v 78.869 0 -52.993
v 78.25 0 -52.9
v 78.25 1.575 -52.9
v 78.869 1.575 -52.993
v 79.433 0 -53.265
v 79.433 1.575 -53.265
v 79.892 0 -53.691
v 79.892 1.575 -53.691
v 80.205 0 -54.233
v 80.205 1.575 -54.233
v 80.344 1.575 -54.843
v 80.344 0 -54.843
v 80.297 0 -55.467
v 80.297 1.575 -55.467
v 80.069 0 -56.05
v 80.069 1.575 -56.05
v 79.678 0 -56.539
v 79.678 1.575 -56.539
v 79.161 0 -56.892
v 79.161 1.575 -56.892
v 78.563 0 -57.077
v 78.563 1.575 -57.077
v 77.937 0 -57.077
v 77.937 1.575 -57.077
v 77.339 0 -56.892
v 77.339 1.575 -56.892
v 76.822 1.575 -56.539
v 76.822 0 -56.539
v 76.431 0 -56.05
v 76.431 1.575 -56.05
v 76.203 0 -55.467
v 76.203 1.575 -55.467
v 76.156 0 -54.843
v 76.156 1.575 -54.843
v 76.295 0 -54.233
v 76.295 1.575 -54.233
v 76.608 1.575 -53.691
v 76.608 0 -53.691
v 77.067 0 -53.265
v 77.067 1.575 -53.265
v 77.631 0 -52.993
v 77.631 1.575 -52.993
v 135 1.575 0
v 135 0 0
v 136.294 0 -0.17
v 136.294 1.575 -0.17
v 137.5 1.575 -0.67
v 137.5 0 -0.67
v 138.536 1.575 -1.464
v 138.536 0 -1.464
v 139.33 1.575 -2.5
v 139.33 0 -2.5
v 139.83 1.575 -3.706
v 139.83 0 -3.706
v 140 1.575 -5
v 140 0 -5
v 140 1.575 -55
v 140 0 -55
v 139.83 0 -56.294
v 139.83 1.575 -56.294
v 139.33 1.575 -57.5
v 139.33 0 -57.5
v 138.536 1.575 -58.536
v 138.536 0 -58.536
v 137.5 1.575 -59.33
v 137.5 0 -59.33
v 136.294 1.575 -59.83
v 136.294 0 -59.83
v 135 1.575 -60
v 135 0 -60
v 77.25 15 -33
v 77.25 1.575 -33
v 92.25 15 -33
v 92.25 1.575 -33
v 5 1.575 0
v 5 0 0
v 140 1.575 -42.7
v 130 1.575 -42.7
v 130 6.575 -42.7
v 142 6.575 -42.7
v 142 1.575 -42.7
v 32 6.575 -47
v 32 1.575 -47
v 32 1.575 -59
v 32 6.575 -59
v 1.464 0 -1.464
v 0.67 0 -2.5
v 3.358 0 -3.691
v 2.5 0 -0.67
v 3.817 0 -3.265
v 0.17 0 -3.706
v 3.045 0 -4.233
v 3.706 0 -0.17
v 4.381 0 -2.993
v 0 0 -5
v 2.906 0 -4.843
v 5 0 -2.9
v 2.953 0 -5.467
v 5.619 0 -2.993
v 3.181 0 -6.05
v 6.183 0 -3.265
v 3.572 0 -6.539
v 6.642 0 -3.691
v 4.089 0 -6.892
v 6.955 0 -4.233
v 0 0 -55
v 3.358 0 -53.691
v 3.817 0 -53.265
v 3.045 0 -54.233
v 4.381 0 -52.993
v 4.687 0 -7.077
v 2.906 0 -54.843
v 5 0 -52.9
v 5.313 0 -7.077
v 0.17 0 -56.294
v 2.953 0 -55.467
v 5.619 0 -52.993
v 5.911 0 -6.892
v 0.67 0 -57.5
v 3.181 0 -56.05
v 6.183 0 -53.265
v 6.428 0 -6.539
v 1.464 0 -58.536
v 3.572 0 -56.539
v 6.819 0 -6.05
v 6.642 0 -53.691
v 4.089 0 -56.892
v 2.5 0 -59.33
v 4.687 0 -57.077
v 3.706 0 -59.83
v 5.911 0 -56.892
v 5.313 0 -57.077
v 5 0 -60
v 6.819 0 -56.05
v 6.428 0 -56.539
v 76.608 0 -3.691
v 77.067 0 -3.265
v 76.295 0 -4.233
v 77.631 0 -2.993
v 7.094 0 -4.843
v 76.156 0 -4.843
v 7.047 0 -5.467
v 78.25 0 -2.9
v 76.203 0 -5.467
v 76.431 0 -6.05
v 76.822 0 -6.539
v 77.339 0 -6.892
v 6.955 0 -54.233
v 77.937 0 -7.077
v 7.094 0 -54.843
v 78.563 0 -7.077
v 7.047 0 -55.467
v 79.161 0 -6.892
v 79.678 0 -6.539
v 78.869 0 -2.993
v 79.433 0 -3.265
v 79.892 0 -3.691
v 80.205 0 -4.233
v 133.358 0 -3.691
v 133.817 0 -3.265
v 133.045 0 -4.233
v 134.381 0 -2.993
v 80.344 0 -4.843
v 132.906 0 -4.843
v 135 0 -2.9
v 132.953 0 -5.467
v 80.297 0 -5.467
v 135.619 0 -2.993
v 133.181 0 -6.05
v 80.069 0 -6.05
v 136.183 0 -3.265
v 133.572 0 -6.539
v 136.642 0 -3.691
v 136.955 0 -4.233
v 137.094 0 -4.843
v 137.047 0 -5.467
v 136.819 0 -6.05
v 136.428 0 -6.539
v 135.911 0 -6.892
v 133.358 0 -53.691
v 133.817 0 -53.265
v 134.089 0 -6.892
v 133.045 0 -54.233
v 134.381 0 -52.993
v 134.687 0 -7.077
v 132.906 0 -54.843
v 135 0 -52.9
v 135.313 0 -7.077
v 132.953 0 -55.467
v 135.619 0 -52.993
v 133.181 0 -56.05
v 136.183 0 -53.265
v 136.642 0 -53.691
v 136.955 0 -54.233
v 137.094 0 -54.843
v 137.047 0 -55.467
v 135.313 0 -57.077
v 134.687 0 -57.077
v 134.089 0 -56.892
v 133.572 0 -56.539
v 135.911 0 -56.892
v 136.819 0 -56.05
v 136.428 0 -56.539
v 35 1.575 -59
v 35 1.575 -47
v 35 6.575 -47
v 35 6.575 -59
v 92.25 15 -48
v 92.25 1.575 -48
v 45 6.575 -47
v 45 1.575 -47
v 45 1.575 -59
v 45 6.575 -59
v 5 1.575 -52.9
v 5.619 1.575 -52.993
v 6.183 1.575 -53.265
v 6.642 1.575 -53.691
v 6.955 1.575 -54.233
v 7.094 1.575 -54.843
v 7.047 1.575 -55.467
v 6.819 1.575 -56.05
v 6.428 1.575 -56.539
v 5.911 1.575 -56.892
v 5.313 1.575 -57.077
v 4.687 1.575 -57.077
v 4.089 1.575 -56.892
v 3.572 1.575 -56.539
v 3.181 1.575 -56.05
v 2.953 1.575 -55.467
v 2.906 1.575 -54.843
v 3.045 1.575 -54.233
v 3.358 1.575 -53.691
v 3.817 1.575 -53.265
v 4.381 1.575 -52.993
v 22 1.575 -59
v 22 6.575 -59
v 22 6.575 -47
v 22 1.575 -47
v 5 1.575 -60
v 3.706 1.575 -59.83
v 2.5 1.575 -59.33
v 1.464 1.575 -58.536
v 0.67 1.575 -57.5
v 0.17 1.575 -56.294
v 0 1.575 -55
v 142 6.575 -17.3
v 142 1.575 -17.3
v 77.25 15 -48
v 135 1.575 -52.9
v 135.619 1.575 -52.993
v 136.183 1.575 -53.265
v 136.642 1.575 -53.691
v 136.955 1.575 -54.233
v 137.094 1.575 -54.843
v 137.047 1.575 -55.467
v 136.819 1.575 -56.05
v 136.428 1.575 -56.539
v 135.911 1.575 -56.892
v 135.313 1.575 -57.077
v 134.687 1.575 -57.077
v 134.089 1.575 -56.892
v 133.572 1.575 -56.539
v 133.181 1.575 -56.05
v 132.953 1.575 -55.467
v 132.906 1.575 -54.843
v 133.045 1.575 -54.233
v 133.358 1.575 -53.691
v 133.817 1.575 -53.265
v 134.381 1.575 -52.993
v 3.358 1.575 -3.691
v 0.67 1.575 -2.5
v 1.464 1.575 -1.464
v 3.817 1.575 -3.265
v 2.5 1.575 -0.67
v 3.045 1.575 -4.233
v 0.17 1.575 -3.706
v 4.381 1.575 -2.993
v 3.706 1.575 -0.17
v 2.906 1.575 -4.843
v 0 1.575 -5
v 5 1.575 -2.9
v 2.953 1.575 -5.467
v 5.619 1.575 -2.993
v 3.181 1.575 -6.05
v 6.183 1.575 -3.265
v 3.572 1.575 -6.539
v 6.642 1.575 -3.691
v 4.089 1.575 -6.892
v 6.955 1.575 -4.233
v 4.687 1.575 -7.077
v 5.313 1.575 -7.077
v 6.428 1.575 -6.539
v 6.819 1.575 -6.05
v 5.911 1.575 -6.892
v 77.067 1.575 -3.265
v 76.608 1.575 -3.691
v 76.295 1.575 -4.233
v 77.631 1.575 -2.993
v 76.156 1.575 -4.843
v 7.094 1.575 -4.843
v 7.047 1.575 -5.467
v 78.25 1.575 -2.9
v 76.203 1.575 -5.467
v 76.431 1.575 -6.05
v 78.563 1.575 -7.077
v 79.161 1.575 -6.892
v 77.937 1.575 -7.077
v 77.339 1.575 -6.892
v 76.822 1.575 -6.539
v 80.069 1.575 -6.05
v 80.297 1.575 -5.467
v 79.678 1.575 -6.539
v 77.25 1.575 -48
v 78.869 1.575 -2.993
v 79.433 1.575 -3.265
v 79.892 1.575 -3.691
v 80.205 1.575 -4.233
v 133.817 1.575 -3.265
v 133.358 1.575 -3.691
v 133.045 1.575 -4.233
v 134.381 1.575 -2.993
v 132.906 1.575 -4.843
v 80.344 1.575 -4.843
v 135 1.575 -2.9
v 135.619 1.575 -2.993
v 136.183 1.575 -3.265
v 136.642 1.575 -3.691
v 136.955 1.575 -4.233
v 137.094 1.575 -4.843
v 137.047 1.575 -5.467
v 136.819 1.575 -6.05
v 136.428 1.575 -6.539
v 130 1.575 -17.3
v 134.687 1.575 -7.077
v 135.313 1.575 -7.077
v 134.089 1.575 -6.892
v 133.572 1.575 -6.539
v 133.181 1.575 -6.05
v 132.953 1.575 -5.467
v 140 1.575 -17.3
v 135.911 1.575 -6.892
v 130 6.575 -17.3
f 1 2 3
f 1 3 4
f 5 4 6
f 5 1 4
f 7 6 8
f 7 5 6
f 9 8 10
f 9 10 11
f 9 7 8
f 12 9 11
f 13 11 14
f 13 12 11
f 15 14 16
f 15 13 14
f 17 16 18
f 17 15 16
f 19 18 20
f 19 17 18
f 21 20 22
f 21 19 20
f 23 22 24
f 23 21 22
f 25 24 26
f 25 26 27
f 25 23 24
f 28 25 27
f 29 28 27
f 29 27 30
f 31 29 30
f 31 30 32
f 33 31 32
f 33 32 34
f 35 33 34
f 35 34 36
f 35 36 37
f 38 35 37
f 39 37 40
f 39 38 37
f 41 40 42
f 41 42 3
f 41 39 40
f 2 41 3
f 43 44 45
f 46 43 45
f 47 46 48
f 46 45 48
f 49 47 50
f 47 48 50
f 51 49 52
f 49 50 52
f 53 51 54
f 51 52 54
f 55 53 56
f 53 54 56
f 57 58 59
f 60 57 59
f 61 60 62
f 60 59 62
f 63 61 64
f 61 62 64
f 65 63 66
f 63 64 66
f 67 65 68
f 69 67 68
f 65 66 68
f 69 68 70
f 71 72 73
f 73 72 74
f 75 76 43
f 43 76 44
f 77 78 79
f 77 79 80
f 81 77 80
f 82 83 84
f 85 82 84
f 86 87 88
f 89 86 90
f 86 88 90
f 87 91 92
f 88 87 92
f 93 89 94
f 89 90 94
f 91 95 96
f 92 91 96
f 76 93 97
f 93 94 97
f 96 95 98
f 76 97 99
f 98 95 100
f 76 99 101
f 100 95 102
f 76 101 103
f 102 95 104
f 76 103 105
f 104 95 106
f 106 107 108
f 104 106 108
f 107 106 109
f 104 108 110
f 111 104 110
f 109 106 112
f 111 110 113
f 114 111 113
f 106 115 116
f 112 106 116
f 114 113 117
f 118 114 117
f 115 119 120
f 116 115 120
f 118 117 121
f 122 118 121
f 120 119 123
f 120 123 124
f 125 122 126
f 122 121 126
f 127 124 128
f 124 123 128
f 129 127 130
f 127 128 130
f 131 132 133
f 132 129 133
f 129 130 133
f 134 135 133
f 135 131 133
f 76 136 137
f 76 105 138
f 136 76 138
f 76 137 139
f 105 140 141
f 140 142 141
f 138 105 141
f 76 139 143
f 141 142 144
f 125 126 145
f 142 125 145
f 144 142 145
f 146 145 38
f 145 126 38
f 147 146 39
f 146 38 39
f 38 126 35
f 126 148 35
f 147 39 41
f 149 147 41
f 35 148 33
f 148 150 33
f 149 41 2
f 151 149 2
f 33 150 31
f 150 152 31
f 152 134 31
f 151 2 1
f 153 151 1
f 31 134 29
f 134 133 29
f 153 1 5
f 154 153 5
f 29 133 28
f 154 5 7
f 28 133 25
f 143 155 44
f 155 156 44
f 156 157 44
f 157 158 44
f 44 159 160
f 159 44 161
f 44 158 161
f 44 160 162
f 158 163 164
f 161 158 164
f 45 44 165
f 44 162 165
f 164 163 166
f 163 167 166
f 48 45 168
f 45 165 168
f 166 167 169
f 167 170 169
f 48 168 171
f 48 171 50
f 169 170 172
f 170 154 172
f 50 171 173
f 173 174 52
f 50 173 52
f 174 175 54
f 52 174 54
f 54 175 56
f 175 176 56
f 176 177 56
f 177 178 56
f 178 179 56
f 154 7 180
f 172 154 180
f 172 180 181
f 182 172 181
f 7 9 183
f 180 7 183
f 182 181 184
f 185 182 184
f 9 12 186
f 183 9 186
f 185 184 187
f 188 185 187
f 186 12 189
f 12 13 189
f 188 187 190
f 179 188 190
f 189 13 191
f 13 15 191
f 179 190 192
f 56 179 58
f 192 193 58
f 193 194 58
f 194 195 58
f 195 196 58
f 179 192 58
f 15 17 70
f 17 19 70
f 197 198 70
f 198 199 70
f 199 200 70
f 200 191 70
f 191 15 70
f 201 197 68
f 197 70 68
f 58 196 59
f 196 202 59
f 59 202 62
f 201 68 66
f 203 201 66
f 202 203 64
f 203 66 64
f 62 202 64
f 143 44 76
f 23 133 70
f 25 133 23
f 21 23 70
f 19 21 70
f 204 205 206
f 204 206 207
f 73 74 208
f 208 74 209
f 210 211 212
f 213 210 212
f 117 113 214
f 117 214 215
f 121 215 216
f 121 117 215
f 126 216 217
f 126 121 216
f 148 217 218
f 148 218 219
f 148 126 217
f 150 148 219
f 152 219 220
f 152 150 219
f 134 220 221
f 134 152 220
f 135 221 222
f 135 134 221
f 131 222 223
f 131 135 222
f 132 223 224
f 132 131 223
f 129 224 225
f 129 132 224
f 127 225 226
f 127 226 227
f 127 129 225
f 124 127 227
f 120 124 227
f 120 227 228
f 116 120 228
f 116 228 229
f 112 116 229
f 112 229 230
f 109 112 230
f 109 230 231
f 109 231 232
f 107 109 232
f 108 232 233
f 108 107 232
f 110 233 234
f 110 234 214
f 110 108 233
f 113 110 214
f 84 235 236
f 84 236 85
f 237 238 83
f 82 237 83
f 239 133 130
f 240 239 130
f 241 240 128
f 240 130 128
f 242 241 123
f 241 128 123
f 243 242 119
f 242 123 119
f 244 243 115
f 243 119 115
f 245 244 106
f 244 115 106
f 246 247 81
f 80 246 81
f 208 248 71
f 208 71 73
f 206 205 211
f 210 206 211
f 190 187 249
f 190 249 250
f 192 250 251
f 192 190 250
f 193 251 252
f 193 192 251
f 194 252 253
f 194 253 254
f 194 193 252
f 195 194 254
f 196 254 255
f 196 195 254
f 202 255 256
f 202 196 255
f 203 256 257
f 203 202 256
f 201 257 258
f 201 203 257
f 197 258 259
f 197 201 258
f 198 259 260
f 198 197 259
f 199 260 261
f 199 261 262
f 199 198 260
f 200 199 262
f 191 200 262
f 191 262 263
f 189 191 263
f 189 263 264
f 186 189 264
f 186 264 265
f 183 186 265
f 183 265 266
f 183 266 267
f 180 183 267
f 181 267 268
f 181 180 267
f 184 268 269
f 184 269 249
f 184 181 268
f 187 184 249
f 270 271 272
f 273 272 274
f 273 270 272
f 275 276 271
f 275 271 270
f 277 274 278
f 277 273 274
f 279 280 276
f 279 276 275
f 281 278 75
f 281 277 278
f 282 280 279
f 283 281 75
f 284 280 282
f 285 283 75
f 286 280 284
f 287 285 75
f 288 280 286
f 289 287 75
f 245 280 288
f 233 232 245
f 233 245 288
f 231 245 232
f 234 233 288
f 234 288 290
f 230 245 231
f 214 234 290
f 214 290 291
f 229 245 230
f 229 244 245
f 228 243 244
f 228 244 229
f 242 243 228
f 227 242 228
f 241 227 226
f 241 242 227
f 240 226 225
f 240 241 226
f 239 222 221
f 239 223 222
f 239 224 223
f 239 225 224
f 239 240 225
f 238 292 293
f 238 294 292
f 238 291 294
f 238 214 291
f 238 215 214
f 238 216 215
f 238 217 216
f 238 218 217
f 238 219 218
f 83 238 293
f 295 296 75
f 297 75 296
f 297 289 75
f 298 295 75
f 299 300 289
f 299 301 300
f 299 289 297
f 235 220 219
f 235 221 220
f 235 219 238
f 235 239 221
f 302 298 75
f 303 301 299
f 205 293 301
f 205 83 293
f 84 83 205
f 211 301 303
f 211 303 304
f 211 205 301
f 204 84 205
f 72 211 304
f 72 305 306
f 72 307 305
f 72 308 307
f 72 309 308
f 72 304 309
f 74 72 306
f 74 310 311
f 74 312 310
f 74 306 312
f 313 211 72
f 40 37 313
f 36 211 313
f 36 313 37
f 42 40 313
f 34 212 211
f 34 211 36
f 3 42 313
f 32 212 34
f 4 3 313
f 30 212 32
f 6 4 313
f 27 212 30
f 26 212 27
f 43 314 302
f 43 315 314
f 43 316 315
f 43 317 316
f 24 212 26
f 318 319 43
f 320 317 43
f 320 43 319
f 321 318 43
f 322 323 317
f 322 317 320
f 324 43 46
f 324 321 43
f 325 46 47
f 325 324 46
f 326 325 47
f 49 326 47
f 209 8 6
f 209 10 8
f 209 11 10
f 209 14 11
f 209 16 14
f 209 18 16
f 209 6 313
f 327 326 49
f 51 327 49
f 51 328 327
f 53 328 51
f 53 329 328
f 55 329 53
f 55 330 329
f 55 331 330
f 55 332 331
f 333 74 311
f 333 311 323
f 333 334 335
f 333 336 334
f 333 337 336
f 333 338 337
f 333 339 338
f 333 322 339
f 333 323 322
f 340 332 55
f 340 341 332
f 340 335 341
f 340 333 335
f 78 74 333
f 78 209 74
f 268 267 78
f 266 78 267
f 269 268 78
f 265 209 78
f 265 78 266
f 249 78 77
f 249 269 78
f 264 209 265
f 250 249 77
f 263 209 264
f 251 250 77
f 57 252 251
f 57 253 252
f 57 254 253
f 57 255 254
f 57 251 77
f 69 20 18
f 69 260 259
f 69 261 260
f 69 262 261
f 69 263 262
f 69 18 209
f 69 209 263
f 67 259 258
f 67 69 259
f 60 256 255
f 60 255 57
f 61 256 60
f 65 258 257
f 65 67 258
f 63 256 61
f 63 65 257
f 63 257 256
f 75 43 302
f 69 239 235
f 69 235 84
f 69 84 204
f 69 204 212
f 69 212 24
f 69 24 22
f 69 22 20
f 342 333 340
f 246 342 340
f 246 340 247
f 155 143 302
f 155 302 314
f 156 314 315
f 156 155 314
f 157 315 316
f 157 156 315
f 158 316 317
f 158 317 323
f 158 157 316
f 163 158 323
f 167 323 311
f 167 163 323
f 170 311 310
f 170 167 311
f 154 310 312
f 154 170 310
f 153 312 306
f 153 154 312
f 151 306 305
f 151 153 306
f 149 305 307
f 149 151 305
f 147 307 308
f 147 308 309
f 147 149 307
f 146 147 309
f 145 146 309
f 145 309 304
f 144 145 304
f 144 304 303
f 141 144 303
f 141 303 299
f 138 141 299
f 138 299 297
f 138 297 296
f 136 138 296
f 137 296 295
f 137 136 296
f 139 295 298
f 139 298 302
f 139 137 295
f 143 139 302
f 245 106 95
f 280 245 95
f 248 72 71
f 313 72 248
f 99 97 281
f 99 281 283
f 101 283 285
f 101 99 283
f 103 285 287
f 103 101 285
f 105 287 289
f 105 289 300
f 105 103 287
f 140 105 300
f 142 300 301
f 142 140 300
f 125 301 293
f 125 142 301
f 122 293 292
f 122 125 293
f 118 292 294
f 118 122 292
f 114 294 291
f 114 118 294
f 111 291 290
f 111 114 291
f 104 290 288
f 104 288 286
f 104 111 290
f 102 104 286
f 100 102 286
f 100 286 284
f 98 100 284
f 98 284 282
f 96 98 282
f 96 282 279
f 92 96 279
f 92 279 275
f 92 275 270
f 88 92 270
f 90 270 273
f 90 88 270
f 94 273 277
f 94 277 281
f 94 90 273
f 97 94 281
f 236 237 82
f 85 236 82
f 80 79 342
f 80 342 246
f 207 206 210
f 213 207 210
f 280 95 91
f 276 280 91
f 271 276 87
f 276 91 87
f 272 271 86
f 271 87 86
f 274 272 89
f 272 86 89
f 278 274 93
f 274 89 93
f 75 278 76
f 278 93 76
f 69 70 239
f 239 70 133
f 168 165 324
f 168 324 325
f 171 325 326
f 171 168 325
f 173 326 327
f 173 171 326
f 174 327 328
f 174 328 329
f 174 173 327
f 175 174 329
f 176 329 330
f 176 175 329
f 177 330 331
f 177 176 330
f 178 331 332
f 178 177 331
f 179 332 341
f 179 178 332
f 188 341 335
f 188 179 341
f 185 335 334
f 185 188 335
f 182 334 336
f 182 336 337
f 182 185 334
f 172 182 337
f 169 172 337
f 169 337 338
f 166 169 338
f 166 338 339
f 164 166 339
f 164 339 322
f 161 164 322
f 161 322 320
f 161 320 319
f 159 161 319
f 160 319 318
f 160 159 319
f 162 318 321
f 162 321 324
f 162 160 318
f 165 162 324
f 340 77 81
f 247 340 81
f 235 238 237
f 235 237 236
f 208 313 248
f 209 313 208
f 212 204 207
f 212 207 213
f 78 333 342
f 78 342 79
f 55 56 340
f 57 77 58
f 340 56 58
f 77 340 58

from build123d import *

# Parameters (mm, degrees)
SKETCH2_R           = 2.1
BOSS_EXTRUDE1_DEPTH = 1.5748
SKETCH3_W           = 12
SKETCH3_H           = 25.4
SKETCH3_W_2         = 10
SKETCH3_H_2         = 12
BOSS_EXTRUDE2_DEPTH = 5
SKETCH5_W           = 15
SKETCH5_H           = 15
BOSS_EXTRUDE3_DEPTH = 13.4252


with BuildPart() as part:
    # Sketch2 → Boss-Extrude1 (new body)
    with BuildSketch(Plane(origin=(0, 0, 0), x_dir=(1, 0, 0), z_dir=(0, 1, 0))):
        with BuildLine():
            Line((5, 0), (135, 0))
            ThreePointArc((135, 0), (138.535533906, 1.464466094), (140, 5))
            Line((140, 5), (140, 55))
            ThreePointArc((140, 55), (138.535533906, 58.535533906), (135, 60))
            Line((135, 60), (5, 60))
            ThreePointArc((5, 60), (1.464466094, 58.535533906), (0, 55))
            Line((0, 55), (0, 5))
            ThreePointArc((0, 5), (1.464466094, 1.464466094), (5, 0))
        make_face()
        with Locations(Location((5, 55, 0), (0, 0, 270))):
            Circle(SKETCH2_R, mode=Mode.SUBTRACT)
        with Locations(Location((5, 5, 0), (0, 0, 270))):
            Circle(SKETCH2_R, mode=Mode.SUBTRACT)
        with Locations(Location((135, 5, 0), (0, 0, 270))):
            Circle(SKETCH2_R, mode=Mode.SUBTRACT)
        with Locations(Location((135, 55, 0), (0, 0, 270))):
            Circle(SKETCH2_R, mode=Mode.SUBTRACT)
        with Locations(Location((78.249999964, 55, 0), (0, 0, 270))):
            Circle(SKETCH2_R, mode=Mode.SUBTRACT)
        with Locations(Location((78.249999964, 5, 0), (0, 0, 270))):
            Circle(SKETCH2_R, mode=Mode.SUBTRACT)
    extrude(amount=BOSS_EXTRUDE1_DEPTH)

    # Sketch3 → Boss-Extrude2 (add)
    with BuildSketch(Plane(origin=(0, 1.5748, 0), x_dir=(1, 0, 0), z_dir=(0, 1, 0))):
        with Locations((136, 30)):
            Rectangle(SKETCH3_W, SKETCH3_H)
        with Locations((40, 53)):
            Rectangle(SKETCH3_W_2, SKETCH3_H_2)
        with Locations((27, 53)):
            Rectangle(SKETCH3_W_2, SKETCH3_H_2)
    extrude(amount=BOSS_EXTRUDE2_DEPTH)

    # Sketch5 → Boss-Extrude3 (add)
    with BuildSketch(Plane(origin=(0, 1.5748, 0), x_dir=(1, 0, 0), z_dir=(0, 1, 0))):
        with Locations((84.749999964, 40.5)):
            Rectangle(SKETCH5_W, SKETCH5_H)
    extrude(amount=BOSS_EXTRUDE3_DEPTH)


solid = part.part
